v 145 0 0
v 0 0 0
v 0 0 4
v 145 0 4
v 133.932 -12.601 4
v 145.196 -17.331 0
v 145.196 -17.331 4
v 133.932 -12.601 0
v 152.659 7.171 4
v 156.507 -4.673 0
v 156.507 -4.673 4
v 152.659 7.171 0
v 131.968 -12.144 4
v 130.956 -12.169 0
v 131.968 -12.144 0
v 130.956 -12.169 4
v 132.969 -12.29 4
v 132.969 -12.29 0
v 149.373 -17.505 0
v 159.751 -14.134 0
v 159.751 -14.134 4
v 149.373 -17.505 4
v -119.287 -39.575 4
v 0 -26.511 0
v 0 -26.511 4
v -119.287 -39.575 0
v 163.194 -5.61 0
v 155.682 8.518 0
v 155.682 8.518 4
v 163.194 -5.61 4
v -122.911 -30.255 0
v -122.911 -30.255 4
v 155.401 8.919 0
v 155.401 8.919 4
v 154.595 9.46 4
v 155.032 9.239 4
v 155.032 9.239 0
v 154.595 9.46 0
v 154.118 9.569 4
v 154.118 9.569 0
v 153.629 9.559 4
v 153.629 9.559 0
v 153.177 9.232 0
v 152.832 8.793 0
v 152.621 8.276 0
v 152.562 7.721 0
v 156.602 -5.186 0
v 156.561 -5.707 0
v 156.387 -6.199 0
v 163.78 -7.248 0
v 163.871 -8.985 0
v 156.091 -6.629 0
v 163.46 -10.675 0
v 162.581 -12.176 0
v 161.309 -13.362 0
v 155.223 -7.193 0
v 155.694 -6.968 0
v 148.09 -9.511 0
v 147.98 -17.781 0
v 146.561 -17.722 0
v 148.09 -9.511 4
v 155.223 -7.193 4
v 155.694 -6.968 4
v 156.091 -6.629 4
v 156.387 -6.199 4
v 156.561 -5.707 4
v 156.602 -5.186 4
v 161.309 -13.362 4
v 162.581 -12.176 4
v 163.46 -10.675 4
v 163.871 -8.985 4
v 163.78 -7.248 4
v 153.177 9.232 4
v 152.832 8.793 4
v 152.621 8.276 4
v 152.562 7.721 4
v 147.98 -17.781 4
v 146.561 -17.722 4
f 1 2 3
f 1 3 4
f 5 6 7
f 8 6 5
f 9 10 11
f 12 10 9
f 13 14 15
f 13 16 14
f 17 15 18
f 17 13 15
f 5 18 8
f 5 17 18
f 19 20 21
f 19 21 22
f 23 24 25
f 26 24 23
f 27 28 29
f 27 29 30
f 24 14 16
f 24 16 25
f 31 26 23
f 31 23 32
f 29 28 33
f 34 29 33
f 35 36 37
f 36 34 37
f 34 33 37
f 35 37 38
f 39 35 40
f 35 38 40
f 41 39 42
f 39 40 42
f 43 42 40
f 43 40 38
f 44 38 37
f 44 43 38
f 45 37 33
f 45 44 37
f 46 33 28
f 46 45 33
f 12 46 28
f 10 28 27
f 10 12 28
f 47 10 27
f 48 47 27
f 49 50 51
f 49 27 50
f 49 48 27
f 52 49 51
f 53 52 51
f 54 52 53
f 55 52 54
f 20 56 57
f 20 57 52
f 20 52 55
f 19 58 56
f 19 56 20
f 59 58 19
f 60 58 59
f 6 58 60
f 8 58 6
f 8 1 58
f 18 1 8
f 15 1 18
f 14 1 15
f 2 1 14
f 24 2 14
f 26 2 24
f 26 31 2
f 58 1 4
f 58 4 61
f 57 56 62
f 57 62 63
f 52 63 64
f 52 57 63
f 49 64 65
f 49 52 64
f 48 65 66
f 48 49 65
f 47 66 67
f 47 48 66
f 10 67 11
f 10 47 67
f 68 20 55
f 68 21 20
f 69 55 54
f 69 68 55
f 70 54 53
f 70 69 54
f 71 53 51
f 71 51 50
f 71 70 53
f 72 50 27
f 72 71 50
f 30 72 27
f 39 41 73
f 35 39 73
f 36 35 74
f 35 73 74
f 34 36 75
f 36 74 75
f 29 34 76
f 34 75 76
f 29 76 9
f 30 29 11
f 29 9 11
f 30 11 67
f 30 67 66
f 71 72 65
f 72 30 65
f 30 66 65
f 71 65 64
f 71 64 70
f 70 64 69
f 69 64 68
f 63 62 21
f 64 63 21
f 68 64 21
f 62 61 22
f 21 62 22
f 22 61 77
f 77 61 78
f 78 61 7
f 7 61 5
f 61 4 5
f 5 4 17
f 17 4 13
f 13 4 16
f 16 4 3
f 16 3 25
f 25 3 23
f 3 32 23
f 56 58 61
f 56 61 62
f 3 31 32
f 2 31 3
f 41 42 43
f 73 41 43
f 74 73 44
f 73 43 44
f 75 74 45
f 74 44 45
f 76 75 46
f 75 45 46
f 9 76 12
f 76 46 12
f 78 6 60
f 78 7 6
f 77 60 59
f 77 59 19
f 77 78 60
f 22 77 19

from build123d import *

# Parameters (mm, degrees)
BOSS_EXTRUDE1_DEPTH = 4
FILLET1_R           = 2
FILLET2_R           = 6


with BuildPart() as part:
    # Sketch1 → Boss-Extrude1 (new body)
    with BuildSketch(Plane.XY):
        Polygon((0, 0), (145, 0), (148.090169944, -9.510565163), (157.125206849, -6.574903716), (152.040911292, 9.072949017), (154.894080841, 10), (166.551226371, -11.92390211), (147.252212567, -18.194531813), (132.5, -12), (0, -26.511110048), (-119.286760587, -39.57513503), (-122.91114097, -30.255056337), align=None)
    extrude(amount=BOSS_EXTRUDE1_DEPTH)

    # Fillet1
    # the kernel refuses this fillet: 2 mm, written as the material it adds along each edge
    with BuildSketch(Plane(origin=(157.125206849, -6.574903716, 0), x_dir=(-0.3090169943749429, 0.951056516295155, 0), z_dir=(0, 0, 1))) as fillet1_piece_1:
        with BuildLine():
            CenterArc((FILLET1_R, FILLET1_R), FILLET1_R, 180, 90)
            Line((0, FILLET1_R), (0, 0))
            Line((0, 0), (FILLET1_R, 0))
        make_face()
    extrude(amount=4)
    # the kernel refuses this fillet: 2 mm, written as the material it takes off along each edge
    with BuildSketch(Plane(origin=(152.040911292, 9.072949017, -5), x_dir=(0.3090169943749437, -0.9510565162951549, 0), z_dir=(0, 0, 1))) as fillet1_2_piece_1:
        with BuildLine():
            CenterArc((FILLET1_R, FILLET1_R), FILLET1_R, 180, 90)
            Line((0, FILLET1_R), (0, 0))
            Line((0, 0), (FILLET1_R, 0))
        make_face()
    extrude(amount=14, mode=Mode.SUBTRACT)
    with BuildSketch(Plane(origin=(154.894080841, 10, -4.195498156), x_dir=(-0.9510565162951539, -0.3090169943749466, 0), z_dir=(0, 0, 1))) as fillet1_2_piece_2:
        with BuildLine():
            CenterArc((FILLET1_R * 0.839099631177, FILLET1_R), FILLET1_R, 190, 80)
            Line((-FILLET1_R * 0.145708121835, FILLET1_R * 0.826351822333), (0, 0))
            Line((0, 0), (FILLET1_R * 0.839099631177, 0))
        make_face()
    extrude(amount=12.390996312, mode=Mode.SUBTRACT)

    # Fillet2
    fillet2_edges = [part.edges().sort_by_distance(p)[0] for p in [
        (166.551226371, -11.92390211, 2),
        (147.252212567, -18.194531813, 2),
        (132.5, -12, 2),
    ]]
    fillet(fillet2_edges, radius=FILLET2_R)


solid = part.part
